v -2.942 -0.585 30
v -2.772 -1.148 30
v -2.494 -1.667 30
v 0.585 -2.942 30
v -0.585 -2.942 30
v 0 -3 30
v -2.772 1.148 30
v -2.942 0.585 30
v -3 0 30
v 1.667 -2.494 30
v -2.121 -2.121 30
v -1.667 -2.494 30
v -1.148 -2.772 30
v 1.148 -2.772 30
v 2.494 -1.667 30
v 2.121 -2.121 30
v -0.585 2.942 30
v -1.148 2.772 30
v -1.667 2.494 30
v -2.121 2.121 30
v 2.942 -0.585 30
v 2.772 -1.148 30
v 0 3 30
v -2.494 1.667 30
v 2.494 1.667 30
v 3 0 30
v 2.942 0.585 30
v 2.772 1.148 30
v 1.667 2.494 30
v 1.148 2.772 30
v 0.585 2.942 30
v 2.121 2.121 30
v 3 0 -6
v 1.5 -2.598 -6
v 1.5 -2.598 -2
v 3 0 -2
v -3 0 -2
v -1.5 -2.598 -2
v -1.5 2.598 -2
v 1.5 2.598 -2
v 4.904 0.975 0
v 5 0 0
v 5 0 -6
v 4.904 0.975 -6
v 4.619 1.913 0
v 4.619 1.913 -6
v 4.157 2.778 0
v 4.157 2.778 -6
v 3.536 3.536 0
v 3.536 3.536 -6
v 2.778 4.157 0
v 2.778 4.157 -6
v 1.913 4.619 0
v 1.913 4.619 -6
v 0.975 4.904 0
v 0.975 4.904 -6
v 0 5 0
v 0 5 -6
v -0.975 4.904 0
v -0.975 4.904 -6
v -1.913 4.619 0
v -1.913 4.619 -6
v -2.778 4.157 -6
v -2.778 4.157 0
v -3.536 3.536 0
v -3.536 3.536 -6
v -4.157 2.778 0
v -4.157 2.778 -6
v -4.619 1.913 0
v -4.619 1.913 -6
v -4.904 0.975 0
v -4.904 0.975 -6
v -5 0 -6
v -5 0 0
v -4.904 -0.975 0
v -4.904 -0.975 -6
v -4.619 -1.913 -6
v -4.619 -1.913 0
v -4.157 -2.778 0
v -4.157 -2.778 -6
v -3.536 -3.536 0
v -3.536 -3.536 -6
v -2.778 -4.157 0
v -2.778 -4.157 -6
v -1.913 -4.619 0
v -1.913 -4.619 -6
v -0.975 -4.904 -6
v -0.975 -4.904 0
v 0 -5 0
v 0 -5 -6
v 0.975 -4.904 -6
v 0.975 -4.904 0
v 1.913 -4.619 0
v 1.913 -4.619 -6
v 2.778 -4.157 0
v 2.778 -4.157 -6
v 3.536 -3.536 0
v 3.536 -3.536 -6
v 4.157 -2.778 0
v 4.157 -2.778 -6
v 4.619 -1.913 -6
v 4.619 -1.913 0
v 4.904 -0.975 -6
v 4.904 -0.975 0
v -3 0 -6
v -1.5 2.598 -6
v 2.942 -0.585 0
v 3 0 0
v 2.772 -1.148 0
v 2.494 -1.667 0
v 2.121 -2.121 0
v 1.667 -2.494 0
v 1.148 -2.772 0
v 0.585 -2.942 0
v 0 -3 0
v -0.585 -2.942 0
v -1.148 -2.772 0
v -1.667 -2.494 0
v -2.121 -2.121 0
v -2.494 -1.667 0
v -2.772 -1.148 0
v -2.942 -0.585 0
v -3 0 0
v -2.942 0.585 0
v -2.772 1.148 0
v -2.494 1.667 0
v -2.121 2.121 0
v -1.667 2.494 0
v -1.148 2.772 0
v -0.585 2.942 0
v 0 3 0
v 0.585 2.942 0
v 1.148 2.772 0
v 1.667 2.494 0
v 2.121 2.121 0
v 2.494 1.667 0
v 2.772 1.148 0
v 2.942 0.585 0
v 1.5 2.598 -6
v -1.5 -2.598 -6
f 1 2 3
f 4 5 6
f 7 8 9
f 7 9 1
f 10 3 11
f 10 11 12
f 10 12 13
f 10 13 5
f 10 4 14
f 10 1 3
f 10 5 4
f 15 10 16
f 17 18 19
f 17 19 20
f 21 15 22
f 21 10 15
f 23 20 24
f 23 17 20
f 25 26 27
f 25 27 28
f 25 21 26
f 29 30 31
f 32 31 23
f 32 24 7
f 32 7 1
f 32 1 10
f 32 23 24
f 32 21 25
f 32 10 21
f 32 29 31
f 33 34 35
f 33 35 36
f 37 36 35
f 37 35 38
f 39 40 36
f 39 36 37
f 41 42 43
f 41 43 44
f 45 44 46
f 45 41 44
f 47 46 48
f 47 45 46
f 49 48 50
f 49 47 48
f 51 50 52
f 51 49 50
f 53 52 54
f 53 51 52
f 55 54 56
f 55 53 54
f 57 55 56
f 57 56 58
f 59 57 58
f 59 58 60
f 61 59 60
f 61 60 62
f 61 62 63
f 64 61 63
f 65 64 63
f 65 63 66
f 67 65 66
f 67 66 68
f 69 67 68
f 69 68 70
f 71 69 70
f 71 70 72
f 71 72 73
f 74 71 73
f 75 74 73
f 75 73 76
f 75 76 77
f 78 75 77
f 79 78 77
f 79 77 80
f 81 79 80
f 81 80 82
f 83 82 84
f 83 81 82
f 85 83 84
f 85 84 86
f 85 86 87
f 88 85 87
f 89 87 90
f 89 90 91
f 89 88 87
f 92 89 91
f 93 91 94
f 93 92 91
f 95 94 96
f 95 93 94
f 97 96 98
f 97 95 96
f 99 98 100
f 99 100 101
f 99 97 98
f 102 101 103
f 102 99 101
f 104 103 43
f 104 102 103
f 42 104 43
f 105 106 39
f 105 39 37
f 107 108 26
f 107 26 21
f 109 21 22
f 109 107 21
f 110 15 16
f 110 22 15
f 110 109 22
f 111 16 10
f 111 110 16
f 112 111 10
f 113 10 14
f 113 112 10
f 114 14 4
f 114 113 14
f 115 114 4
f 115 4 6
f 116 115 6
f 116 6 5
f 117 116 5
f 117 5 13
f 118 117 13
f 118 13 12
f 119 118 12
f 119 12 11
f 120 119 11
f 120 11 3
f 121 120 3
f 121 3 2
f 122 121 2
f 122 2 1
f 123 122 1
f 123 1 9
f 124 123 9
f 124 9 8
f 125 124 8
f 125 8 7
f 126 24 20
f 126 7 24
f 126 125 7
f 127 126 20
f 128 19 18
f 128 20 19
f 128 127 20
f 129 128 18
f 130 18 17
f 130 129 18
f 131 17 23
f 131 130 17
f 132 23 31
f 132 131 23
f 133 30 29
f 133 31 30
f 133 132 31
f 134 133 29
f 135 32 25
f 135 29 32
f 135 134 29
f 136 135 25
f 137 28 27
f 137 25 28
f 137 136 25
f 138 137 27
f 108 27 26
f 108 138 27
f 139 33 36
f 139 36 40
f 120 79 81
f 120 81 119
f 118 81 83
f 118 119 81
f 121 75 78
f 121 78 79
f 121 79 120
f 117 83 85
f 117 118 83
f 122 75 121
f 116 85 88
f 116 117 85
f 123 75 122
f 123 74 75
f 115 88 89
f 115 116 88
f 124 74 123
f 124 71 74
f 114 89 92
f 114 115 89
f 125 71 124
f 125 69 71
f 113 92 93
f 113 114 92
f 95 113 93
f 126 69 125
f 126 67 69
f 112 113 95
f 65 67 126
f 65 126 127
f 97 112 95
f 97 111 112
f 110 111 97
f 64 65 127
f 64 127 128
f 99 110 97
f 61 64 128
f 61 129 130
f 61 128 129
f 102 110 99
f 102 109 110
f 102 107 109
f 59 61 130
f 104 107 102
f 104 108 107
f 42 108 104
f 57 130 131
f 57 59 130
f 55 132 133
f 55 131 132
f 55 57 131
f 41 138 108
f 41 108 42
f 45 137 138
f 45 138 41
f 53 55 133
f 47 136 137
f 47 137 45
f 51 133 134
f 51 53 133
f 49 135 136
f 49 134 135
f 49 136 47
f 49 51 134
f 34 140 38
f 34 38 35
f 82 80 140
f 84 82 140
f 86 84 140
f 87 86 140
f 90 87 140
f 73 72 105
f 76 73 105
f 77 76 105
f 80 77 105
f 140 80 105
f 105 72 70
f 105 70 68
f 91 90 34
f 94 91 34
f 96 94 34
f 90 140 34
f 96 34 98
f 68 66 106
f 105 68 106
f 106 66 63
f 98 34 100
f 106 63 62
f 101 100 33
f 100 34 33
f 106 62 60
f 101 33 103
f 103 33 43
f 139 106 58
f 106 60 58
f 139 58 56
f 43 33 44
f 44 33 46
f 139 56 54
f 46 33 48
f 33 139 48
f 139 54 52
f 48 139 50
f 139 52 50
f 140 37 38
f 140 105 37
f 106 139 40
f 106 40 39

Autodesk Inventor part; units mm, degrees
ref_plane "YZ Plane" through (0, 0, 0) normal (1, 0, 0) x (0, 1, 0)
ref_plane "XZ Plane" through (0, 0, 0) normal (0, 1, 0) x (-1, 0, 0)
ref_plane "XY Plane" through (0, 0, 0) normal (0, 0, 1) x (1, 0, 0)
sketch "Boceto1" plane through (0, 0, 0) normal (0, 0, 1) x (1, 0, 0)
  circle A0 centre (0, 0) radius 3
  circle A1 centre (0, 0) radius 5
  dimension "d0" = 6
  dimension "d1" = 10
extrude "Extrusión1" add sketch "Boceto1" along normal blind 30 contours A0
extrude "Extrusión2" add sketch "Boceto1" against normal blind 6 contours A0 | A1
thread "Rosca1" size "M6x1" class "6g" standard "ANSI Metric M Profile" full length
sketch "Boceto2" plane through (0, 0, -6) normal (0, 0, -1) x (-1, 0, 0)
  line L0 (3, 0) -> (1.5, -2.5981)
  line L1 (1.5, -2.5981) -> (-1.5, -2.5981)
  line L2 (-1.5, -2.5981) -> (-3, 0)
  line L3 (-3, 0) -> (-1.5, 2.5981)
  line L4 (-1.5, 2.5981) -> (1.5, 2.5981)
  line L5 (1.5, 2.5981) -> (3, 0)
  point P0 (0, 0)
  point P1 (0, 0)
  dimension "d8" = 6
extrude "Extrusión3" cut sketch "Boceto2" against normal blind 4
properties part number "tornilloM6x30mm" material "Hierro, dúctil"
